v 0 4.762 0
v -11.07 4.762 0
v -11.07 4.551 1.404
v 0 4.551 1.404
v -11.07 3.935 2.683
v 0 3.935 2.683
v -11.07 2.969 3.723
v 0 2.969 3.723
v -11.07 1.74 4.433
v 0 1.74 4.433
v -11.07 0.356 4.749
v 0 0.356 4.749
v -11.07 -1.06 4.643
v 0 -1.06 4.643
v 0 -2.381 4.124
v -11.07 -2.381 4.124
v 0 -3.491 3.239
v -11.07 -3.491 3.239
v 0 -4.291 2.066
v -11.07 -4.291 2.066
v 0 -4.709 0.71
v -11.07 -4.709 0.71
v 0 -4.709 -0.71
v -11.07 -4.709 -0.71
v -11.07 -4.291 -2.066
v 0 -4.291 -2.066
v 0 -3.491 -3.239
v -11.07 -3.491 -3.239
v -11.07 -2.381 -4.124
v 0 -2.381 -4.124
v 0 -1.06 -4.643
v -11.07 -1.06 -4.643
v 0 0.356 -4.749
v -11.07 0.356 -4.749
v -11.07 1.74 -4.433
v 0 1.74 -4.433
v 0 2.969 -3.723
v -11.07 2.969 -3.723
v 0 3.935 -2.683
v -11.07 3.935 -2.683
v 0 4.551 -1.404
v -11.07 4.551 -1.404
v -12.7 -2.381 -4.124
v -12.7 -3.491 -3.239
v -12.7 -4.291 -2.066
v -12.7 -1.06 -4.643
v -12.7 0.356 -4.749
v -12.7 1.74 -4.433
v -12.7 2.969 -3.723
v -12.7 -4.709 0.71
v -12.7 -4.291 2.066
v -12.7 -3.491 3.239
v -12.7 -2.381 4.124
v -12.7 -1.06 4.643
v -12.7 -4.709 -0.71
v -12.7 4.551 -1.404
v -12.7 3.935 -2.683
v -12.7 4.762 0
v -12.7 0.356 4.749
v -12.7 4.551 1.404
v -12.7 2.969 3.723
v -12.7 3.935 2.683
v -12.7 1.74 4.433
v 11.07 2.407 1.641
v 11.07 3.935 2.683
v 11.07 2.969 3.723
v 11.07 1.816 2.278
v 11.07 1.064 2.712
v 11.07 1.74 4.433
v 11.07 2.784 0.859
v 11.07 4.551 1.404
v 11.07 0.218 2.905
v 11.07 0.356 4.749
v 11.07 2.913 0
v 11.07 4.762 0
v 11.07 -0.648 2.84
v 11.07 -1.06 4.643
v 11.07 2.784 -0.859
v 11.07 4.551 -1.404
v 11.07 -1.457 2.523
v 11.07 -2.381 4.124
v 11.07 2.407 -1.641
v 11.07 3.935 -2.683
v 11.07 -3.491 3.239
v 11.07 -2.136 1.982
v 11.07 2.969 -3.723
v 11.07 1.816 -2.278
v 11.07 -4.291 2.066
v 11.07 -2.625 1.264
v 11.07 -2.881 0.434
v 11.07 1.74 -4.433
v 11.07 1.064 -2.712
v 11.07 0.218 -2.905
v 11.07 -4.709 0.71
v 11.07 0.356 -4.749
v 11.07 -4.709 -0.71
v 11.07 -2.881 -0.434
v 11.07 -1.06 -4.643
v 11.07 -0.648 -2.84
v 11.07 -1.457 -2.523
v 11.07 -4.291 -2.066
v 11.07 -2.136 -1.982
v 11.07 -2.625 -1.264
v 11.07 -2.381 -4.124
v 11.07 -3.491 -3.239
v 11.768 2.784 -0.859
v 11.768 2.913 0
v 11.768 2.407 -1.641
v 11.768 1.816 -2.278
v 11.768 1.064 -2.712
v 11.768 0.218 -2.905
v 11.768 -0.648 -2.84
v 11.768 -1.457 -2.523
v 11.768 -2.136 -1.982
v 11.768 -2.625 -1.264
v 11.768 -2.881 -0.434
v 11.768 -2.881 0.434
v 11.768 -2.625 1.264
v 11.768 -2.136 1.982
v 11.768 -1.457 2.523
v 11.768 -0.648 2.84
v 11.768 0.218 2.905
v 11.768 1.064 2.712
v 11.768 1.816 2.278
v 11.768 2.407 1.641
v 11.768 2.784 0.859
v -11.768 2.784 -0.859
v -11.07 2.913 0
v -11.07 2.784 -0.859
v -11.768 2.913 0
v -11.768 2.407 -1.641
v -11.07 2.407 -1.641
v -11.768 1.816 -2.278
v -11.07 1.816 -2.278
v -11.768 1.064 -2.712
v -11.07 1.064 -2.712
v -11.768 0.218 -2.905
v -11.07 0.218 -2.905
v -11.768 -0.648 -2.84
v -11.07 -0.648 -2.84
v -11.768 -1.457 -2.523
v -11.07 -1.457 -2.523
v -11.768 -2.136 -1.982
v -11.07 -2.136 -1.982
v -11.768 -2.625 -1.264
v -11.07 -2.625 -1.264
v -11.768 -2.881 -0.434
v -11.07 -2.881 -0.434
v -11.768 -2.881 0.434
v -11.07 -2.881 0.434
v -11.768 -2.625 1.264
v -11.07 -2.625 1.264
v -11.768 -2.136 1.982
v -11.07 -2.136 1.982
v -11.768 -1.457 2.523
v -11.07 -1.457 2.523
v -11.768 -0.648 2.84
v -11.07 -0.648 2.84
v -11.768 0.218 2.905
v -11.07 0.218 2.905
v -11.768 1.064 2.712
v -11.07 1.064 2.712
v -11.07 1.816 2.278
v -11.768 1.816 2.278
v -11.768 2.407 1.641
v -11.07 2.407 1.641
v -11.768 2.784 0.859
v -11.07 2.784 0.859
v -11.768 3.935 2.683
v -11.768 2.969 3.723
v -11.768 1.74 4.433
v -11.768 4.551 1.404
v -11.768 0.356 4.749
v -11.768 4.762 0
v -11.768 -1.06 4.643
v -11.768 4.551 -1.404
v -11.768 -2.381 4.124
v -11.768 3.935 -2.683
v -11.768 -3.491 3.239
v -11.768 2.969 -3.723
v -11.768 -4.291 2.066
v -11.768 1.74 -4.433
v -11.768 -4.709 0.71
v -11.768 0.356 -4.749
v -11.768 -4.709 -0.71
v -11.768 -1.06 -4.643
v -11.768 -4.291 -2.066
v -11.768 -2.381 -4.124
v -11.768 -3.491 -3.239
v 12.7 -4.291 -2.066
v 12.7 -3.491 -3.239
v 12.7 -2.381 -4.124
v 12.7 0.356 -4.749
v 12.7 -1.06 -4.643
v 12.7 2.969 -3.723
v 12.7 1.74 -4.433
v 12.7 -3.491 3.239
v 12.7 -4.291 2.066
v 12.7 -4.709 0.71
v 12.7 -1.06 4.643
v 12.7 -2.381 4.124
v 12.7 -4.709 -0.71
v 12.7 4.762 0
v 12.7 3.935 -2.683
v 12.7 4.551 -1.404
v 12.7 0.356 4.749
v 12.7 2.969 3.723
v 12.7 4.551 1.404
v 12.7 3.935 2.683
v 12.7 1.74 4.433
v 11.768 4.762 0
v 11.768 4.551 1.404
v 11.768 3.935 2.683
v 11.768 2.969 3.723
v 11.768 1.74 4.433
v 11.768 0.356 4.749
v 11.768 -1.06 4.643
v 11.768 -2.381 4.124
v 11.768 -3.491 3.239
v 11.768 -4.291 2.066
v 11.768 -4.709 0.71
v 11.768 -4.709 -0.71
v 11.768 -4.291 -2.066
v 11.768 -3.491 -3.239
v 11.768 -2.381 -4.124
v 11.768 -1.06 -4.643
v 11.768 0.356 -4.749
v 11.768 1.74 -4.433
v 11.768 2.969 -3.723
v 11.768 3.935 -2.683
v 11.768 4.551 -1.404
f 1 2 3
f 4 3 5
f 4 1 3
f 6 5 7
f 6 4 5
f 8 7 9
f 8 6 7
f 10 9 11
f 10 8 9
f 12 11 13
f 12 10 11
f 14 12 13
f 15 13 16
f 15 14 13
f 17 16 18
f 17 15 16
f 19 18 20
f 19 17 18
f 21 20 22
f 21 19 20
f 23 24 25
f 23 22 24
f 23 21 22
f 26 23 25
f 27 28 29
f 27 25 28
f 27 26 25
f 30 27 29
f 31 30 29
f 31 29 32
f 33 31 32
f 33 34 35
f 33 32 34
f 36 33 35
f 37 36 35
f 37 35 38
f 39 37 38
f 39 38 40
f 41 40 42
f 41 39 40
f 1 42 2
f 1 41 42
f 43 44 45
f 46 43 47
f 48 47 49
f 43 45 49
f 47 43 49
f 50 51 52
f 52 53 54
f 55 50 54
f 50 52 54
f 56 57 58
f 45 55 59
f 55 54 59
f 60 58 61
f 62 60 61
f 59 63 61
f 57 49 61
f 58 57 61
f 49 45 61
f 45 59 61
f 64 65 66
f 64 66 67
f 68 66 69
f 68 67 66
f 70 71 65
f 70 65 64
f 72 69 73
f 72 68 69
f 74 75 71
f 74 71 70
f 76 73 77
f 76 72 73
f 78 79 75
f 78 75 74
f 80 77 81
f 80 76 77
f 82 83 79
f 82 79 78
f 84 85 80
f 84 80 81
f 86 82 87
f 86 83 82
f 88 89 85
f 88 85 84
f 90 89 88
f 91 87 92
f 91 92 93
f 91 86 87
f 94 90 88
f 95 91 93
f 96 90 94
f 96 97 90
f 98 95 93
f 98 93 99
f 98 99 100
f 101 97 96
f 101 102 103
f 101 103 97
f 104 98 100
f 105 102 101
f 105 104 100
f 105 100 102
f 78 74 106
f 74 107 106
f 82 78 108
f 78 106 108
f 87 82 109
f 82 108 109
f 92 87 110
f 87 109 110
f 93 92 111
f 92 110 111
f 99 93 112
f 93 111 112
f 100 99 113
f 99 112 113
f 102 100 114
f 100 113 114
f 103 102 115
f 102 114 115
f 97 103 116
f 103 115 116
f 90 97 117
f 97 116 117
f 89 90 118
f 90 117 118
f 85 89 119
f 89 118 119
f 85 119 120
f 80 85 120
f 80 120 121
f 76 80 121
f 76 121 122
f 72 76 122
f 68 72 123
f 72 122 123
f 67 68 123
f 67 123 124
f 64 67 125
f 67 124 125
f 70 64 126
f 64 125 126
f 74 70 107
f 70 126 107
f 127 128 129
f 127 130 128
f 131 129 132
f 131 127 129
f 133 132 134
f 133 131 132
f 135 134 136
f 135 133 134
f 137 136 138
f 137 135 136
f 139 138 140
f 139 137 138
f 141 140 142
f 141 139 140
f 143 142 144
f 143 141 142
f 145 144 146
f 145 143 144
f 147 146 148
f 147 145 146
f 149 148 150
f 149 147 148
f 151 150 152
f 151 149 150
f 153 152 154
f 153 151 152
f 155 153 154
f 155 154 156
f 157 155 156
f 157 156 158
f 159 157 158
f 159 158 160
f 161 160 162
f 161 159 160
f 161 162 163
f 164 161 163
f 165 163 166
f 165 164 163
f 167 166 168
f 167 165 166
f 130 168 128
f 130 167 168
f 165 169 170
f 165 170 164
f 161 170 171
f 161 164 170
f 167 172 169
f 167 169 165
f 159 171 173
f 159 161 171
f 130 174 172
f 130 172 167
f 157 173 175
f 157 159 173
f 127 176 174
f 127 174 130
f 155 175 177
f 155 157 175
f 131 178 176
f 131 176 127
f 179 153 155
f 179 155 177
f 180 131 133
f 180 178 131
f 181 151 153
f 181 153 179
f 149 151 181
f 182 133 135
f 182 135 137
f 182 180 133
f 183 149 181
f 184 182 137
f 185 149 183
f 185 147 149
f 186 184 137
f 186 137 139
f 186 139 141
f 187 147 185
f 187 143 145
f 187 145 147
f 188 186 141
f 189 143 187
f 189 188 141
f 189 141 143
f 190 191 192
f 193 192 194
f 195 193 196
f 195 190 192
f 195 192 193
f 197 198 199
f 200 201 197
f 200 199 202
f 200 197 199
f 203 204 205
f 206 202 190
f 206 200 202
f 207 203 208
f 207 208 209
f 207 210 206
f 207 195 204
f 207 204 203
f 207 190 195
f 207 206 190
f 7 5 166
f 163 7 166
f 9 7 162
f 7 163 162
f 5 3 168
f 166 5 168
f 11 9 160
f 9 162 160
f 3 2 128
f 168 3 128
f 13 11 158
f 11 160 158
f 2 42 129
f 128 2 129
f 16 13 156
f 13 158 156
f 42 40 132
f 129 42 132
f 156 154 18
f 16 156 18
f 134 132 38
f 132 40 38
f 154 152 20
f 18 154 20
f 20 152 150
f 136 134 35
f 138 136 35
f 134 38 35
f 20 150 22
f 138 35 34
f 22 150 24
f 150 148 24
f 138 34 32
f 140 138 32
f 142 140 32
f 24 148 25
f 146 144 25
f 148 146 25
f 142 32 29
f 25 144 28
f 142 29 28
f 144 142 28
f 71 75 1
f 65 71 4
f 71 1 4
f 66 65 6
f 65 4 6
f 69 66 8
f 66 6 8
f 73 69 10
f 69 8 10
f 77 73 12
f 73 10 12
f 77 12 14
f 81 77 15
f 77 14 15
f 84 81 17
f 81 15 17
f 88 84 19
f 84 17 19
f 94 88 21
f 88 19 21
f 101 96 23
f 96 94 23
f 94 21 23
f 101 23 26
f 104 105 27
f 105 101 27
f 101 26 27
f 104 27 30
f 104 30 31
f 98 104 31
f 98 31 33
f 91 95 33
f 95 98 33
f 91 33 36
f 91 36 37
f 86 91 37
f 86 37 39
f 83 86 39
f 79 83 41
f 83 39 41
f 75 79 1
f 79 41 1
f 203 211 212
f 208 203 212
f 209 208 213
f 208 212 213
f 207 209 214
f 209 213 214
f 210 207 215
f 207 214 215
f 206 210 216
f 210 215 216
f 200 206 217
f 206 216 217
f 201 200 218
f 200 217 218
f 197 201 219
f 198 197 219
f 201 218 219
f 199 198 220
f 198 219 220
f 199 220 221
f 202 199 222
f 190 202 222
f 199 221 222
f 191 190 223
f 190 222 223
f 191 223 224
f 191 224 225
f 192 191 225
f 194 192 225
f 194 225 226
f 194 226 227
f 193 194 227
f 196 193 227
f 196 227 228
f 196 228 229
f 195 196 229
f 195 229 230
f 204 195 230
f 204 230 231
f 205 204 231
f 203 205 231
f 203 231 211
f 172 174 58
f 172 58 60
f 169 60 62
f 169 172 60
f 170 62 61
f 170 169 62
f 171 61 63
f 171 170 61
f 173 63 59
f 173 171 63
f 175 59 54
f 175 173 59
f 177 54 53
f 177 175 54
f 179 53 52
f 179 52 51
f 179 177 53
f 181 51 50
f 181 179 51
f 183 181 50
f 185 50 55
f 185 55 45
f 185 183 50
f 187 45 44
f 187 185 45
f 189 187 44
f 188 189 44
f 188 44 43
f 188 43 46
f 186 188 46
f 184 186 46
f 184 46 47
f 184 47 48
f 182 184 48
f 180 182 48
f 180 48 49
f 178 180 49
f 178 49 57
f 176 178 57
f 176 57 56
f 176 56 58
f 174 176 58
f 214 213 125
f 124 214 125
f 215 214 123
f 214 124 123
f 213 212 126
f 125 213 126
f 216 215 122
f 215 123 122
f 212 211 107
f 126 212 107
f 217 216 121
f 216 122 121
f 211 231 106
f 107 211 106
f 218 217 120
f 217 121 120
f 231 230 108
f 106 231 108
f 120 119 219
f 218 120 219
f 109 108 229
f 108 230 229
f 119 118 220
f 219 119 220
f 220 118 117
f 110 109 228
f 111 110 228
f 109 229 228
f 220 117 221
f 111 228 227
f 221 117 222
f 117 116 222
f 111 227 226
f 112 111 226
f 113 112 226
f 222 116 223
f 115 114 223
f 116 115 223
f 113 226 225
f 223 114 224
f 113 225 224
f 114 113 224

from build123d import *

# Parameters (mm, degrees)
F0_R     = 4.7625
F1_DEPTH = 12.7
F2_W     = 0.698456
F2_H     = 2.279171


with BuildPart() as f1:
    # F0 (on Right) → F1 (new body)
    with BuildSketch(Plane.YZ):
        Circle(F0_R)
    extrude(amount=F1_DEPTH)

    # F2 (on Top) → F3 (revolve, cut)
    with BuildSketch(Plane.XY):
        with Locations((11.419214, 4.052942)):
            Rectangle(F2_W, F2_H)
    revolve(axis=Axis((11.608969, 0, 0), (-1, 0, 0)), mode=Mode.SUBTRACT)

    # F4: F1 across plane


with BuildPart() as f1_1:
    add(f1.part)
    add(f1.part.mirror(Plane.YZ))


solid = f1_1.part
